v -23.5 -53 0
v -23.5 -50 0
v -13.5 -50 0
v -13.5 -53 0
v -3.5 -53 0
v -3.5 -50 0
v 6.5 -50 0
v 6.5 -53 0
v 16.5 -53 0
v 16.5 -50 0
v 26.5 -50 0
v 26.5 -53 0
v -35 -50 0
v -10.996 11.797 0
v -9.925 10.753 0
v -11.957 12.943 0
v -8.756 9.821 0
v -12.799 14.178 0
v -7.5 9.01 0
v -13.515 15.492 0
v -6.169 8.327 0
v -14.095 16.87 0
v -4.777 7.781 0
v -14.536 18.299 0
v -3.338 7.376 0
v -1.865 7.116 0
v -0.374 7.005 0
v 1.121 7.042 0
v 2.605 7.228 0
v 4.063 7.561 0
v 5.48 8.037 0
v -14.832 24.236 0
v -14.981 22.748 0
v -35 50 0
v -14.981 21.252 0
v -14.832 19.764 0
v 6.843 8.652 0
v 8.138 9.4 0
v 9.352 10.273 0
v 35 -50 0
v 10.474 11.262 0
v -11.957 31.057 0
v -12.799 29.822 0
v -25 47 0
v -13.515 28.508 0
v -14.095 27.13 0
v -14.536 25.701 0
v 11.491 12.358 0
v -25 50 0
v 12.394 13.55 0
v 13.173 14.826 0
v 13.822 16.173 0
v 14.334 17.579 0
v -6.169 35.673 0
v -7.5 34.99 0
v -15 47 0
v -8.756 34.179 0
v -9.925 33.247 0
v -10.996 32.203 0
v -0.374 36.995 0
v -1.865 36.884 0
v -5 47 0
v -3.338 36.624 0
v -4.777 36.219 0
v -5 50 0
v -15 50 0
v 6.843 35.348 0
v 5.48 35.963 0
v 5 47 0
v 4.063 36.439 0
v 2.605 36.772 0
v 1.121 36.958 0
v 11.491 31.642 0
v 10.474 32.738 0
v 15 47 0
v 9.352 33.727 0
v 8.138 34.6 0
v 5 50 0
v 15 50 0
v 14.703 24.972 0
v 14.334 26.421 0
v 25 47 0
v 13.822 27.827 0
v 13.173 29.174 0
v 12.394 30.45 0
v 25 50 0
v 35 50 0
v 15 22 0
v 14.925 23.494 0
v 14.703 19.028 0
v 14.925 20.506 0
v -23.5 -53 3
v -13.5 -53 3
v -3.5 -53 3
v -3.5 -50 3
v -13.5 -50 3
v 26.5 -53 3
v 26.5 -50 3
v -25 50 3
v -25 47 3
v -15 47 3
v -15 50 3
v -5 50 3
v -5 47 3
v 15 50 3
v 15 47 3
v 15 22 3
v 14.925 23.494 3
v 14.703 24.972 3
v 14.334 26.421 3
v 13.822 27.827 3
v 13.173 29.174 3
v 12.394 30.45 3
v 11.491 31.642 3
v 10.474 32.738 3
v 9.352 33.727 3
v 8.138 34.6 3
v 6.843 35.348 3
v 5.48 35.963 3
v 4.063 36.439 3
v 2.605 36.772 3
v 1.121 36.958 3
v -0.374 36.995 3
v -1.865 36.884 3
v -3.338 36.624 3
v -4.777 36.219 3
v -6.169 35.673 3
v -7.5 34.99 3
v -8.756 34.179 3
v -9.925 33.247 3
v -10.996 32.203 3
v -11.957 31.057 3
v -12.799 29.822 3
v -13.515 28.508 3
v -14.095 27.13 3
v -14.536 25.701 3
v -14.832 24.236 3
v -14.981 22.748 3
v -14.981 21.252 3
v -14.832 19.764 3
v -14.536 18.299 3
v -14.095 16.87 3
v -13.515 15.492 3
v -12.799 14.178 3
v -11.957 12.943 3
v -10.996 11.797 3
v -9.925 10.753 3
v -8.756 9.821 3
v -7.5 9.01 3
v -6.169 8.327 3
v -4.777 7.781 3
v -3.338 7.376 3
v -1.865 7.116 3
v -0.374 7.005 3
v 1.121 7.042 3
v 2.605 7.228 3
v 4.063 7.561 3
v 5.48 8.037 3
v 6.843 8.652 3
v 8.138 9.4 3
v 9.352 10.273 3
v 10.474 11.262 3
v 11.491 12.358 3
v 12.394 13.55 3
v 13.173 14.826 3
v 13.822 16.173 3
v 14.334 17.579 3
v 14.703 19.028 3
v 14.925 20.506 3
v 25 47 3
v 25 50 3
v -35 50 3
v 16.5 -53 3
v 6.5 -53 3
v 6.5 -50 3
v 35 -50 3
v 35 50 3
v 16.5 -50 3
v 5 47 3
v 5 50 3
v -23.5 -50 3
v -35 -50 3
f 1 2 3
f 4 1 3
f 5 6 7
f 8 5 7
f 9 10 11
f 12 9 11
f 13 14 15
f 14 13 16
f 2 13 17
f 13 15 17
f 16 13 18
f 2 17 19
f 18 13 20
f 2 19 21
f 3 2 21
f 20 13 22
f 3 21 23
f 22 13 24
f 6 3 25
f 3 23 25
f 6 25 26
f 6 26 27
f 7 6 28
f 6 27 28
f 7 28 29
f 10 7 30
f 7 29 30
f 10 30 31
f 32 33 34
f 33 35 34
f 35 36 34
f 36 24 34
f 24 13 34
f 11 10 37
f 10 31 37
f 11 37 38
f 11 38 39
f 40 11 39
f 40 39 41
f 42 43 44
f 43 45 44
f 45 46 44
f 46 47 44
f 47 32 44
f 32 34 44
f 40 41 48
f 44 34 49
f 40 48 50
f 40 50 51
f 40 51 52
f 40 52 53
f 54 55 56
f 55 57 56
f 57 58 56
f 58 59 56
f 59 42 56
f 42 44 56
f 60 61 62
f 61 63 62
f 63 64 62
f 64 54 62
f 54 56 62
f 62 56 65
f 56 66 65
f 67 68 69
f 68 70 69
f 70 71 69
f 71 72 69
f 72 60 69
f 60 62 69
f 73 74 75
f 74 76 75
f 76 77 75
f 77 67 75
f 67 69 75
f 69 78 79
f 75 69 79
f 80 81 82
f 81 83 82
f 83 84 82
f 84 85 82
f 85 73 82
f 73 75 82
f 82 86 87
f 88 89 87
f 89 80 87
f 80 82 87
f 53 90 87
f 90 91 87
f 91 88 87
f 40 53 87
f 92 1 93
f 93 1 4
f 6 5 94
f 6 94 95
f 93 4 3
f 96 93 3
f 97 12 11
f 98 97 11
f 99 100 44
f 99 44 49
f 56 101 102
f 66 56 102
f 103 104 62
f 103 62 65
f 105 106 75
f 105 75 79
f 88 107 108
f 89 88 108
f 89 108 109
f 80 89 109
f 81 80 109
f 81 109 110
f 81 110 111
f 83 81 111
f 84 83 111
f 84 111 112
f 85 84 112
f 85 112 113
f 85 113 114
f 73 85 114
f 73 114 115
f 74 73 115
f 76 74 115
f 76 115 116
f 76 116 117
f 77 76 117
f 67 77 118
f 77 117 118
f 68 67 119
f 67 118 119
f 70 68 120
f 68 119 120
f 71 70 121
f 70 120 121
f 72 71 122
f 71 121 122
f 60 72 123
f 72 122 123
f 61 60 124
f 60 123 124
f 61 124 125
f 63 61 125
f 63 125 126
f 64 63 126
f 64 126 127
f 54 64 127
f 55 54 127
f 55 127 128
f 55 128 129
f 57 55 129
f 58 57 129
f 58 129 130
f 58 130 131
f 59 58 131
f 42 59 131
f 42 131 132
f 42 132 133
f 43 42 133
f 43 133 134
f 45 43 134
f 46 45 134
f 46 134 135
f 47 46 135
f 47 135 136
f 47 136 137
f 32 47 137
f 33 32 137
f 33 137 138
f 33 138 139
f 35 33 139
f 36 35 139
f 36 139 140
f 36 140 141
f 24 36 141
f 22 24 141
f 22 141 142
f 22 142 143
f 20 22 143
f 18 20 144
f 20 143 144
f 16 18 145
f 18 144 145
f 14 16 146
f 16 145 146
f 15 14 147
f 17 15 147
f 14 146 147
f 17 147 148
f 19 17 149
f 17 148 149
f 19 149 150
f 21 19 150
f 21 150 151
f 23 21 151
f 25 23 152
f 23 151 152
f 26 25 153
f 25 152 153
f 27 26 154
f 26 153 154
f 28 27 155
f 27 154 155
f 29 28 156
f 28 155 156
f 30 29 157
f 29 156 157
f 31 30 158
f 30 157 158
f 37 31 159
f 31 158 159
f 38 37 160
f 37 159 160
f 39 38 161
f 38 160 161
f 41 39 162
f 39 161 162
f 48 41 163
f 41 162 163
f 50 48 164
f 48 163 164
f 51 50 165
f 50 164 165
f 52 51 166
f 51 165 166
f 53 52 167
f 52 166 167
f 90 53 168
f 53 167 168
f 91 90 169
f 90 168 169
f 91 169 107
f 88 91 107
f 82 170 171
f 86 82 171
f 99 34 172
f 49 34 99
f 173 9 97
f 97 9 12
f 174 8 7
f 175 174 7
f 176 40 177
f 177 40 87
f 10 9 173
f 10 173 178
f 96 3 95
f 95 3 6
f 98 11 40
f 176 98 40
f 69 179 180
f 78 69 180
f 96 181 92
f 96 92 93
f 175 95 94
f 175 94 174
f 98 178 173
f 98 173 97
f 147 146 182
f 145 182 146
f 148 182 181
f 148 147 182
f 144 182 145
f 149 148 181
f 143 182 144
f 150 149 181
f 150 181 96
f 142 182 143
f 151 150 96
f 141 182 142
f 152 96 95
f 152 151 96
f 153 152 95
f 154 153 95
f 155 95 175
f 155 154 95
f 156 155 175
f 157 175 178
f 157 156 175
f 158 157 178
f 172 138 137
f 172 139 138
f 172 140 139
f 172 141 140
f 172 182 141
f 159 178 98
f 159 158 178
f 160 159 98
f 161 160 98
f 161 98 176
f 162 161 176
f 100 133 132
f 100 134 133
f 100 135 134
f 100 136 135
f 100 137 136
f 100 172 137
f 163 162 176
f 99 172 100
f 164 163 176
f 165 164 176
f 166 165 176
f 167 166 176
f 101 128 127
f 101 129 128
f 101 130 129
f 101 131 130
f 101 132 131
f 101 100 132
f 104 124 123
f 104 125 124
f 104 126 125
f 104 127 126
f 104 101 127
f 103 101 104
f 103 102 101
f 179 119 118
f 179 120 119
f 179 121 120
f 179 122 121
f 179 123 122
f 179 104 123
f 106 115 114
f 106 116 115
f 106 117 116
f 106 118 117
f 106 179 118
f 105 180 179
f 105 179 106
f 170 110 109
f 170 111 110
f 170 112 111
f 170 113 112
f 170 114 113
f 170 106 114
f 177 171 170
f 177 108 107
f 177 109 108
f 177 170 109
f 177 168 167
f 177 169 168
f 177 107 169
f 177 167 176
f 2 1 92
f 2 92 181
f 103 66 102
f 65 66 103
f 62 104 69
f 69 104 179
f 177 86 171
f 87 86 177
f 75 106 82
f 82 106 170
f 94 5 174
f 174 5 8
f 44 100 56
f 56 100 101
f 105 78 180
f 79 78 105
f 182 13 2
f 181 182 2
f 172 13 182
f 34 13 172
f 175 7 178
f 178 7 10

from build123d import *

# Parameters (mm, degrees)
SKETCH1_W           = 70
SKETCH1_H           = 100
SKETCH1_W_2         = 10
SKETCH1_H_2         = 3
BOSS_EXTRUDE1_DEPTH = 3
SKETCH2_W           = 10
SKETCH2_H           = 3
CUT_EXTRUDE1_DEPTH  = 64.584589328
SKETCH3_R           = 15
CUT_EXTRUDE2_DEPTH  = 64.584589328


with BuildPart() as part:
    # Sketch1 → Boss-Extrude1 (new body)
    with BuildSketch(Plane.XY):
        Rectangle(SKETCH1_W, SKETCH1_H)
        with Locations((21.5, -51.5)):
            Rectangle(SKETCH1_W_2, SKETCH1_H_2)
        with Locations((1.5, -51.5)):
            Rectangle(SKETCH1_W_2, SKETCH1_H_2)
        with Locations((-18.5, -51.5)):
            Rectangle(SKETCH1_W_2, SKETCH1_H_2)
    extrude(amount=BOSS_EXTRUDE1_DEPTH)

    # Sketch2 → Cut-Extrude1 (cut, through all)
    with BuildSketch(Plane.XY.offset(3)):
        with Locations((-20, 48.5)):
            Rectangle(SKETCH2_W, SKETCH2_H)
        with Locations((0, 48.5)):
            Rectangle(SKETCH2_W, SKETCH2_H)
        with Locations((20, 48.5)):
            Rectangle(SKETCH2_W, SKETCH2_H)
    extrude(amount=-CUT_EXTRUDE1_DEPTH, mode=Mode.SUBTRACT)

    # Sketch3 → Cut-Extrude2 (cut, through all)
    with BuildSketch(Plane.XY.offset(3)):
        with Locations((0, 22)):
            Circle(SKETCH3_R)
    extrude(amount=-CUT_EXTRUDE2_DEPTH, mode=Mode.SUBTRACT)


solid = part.part
